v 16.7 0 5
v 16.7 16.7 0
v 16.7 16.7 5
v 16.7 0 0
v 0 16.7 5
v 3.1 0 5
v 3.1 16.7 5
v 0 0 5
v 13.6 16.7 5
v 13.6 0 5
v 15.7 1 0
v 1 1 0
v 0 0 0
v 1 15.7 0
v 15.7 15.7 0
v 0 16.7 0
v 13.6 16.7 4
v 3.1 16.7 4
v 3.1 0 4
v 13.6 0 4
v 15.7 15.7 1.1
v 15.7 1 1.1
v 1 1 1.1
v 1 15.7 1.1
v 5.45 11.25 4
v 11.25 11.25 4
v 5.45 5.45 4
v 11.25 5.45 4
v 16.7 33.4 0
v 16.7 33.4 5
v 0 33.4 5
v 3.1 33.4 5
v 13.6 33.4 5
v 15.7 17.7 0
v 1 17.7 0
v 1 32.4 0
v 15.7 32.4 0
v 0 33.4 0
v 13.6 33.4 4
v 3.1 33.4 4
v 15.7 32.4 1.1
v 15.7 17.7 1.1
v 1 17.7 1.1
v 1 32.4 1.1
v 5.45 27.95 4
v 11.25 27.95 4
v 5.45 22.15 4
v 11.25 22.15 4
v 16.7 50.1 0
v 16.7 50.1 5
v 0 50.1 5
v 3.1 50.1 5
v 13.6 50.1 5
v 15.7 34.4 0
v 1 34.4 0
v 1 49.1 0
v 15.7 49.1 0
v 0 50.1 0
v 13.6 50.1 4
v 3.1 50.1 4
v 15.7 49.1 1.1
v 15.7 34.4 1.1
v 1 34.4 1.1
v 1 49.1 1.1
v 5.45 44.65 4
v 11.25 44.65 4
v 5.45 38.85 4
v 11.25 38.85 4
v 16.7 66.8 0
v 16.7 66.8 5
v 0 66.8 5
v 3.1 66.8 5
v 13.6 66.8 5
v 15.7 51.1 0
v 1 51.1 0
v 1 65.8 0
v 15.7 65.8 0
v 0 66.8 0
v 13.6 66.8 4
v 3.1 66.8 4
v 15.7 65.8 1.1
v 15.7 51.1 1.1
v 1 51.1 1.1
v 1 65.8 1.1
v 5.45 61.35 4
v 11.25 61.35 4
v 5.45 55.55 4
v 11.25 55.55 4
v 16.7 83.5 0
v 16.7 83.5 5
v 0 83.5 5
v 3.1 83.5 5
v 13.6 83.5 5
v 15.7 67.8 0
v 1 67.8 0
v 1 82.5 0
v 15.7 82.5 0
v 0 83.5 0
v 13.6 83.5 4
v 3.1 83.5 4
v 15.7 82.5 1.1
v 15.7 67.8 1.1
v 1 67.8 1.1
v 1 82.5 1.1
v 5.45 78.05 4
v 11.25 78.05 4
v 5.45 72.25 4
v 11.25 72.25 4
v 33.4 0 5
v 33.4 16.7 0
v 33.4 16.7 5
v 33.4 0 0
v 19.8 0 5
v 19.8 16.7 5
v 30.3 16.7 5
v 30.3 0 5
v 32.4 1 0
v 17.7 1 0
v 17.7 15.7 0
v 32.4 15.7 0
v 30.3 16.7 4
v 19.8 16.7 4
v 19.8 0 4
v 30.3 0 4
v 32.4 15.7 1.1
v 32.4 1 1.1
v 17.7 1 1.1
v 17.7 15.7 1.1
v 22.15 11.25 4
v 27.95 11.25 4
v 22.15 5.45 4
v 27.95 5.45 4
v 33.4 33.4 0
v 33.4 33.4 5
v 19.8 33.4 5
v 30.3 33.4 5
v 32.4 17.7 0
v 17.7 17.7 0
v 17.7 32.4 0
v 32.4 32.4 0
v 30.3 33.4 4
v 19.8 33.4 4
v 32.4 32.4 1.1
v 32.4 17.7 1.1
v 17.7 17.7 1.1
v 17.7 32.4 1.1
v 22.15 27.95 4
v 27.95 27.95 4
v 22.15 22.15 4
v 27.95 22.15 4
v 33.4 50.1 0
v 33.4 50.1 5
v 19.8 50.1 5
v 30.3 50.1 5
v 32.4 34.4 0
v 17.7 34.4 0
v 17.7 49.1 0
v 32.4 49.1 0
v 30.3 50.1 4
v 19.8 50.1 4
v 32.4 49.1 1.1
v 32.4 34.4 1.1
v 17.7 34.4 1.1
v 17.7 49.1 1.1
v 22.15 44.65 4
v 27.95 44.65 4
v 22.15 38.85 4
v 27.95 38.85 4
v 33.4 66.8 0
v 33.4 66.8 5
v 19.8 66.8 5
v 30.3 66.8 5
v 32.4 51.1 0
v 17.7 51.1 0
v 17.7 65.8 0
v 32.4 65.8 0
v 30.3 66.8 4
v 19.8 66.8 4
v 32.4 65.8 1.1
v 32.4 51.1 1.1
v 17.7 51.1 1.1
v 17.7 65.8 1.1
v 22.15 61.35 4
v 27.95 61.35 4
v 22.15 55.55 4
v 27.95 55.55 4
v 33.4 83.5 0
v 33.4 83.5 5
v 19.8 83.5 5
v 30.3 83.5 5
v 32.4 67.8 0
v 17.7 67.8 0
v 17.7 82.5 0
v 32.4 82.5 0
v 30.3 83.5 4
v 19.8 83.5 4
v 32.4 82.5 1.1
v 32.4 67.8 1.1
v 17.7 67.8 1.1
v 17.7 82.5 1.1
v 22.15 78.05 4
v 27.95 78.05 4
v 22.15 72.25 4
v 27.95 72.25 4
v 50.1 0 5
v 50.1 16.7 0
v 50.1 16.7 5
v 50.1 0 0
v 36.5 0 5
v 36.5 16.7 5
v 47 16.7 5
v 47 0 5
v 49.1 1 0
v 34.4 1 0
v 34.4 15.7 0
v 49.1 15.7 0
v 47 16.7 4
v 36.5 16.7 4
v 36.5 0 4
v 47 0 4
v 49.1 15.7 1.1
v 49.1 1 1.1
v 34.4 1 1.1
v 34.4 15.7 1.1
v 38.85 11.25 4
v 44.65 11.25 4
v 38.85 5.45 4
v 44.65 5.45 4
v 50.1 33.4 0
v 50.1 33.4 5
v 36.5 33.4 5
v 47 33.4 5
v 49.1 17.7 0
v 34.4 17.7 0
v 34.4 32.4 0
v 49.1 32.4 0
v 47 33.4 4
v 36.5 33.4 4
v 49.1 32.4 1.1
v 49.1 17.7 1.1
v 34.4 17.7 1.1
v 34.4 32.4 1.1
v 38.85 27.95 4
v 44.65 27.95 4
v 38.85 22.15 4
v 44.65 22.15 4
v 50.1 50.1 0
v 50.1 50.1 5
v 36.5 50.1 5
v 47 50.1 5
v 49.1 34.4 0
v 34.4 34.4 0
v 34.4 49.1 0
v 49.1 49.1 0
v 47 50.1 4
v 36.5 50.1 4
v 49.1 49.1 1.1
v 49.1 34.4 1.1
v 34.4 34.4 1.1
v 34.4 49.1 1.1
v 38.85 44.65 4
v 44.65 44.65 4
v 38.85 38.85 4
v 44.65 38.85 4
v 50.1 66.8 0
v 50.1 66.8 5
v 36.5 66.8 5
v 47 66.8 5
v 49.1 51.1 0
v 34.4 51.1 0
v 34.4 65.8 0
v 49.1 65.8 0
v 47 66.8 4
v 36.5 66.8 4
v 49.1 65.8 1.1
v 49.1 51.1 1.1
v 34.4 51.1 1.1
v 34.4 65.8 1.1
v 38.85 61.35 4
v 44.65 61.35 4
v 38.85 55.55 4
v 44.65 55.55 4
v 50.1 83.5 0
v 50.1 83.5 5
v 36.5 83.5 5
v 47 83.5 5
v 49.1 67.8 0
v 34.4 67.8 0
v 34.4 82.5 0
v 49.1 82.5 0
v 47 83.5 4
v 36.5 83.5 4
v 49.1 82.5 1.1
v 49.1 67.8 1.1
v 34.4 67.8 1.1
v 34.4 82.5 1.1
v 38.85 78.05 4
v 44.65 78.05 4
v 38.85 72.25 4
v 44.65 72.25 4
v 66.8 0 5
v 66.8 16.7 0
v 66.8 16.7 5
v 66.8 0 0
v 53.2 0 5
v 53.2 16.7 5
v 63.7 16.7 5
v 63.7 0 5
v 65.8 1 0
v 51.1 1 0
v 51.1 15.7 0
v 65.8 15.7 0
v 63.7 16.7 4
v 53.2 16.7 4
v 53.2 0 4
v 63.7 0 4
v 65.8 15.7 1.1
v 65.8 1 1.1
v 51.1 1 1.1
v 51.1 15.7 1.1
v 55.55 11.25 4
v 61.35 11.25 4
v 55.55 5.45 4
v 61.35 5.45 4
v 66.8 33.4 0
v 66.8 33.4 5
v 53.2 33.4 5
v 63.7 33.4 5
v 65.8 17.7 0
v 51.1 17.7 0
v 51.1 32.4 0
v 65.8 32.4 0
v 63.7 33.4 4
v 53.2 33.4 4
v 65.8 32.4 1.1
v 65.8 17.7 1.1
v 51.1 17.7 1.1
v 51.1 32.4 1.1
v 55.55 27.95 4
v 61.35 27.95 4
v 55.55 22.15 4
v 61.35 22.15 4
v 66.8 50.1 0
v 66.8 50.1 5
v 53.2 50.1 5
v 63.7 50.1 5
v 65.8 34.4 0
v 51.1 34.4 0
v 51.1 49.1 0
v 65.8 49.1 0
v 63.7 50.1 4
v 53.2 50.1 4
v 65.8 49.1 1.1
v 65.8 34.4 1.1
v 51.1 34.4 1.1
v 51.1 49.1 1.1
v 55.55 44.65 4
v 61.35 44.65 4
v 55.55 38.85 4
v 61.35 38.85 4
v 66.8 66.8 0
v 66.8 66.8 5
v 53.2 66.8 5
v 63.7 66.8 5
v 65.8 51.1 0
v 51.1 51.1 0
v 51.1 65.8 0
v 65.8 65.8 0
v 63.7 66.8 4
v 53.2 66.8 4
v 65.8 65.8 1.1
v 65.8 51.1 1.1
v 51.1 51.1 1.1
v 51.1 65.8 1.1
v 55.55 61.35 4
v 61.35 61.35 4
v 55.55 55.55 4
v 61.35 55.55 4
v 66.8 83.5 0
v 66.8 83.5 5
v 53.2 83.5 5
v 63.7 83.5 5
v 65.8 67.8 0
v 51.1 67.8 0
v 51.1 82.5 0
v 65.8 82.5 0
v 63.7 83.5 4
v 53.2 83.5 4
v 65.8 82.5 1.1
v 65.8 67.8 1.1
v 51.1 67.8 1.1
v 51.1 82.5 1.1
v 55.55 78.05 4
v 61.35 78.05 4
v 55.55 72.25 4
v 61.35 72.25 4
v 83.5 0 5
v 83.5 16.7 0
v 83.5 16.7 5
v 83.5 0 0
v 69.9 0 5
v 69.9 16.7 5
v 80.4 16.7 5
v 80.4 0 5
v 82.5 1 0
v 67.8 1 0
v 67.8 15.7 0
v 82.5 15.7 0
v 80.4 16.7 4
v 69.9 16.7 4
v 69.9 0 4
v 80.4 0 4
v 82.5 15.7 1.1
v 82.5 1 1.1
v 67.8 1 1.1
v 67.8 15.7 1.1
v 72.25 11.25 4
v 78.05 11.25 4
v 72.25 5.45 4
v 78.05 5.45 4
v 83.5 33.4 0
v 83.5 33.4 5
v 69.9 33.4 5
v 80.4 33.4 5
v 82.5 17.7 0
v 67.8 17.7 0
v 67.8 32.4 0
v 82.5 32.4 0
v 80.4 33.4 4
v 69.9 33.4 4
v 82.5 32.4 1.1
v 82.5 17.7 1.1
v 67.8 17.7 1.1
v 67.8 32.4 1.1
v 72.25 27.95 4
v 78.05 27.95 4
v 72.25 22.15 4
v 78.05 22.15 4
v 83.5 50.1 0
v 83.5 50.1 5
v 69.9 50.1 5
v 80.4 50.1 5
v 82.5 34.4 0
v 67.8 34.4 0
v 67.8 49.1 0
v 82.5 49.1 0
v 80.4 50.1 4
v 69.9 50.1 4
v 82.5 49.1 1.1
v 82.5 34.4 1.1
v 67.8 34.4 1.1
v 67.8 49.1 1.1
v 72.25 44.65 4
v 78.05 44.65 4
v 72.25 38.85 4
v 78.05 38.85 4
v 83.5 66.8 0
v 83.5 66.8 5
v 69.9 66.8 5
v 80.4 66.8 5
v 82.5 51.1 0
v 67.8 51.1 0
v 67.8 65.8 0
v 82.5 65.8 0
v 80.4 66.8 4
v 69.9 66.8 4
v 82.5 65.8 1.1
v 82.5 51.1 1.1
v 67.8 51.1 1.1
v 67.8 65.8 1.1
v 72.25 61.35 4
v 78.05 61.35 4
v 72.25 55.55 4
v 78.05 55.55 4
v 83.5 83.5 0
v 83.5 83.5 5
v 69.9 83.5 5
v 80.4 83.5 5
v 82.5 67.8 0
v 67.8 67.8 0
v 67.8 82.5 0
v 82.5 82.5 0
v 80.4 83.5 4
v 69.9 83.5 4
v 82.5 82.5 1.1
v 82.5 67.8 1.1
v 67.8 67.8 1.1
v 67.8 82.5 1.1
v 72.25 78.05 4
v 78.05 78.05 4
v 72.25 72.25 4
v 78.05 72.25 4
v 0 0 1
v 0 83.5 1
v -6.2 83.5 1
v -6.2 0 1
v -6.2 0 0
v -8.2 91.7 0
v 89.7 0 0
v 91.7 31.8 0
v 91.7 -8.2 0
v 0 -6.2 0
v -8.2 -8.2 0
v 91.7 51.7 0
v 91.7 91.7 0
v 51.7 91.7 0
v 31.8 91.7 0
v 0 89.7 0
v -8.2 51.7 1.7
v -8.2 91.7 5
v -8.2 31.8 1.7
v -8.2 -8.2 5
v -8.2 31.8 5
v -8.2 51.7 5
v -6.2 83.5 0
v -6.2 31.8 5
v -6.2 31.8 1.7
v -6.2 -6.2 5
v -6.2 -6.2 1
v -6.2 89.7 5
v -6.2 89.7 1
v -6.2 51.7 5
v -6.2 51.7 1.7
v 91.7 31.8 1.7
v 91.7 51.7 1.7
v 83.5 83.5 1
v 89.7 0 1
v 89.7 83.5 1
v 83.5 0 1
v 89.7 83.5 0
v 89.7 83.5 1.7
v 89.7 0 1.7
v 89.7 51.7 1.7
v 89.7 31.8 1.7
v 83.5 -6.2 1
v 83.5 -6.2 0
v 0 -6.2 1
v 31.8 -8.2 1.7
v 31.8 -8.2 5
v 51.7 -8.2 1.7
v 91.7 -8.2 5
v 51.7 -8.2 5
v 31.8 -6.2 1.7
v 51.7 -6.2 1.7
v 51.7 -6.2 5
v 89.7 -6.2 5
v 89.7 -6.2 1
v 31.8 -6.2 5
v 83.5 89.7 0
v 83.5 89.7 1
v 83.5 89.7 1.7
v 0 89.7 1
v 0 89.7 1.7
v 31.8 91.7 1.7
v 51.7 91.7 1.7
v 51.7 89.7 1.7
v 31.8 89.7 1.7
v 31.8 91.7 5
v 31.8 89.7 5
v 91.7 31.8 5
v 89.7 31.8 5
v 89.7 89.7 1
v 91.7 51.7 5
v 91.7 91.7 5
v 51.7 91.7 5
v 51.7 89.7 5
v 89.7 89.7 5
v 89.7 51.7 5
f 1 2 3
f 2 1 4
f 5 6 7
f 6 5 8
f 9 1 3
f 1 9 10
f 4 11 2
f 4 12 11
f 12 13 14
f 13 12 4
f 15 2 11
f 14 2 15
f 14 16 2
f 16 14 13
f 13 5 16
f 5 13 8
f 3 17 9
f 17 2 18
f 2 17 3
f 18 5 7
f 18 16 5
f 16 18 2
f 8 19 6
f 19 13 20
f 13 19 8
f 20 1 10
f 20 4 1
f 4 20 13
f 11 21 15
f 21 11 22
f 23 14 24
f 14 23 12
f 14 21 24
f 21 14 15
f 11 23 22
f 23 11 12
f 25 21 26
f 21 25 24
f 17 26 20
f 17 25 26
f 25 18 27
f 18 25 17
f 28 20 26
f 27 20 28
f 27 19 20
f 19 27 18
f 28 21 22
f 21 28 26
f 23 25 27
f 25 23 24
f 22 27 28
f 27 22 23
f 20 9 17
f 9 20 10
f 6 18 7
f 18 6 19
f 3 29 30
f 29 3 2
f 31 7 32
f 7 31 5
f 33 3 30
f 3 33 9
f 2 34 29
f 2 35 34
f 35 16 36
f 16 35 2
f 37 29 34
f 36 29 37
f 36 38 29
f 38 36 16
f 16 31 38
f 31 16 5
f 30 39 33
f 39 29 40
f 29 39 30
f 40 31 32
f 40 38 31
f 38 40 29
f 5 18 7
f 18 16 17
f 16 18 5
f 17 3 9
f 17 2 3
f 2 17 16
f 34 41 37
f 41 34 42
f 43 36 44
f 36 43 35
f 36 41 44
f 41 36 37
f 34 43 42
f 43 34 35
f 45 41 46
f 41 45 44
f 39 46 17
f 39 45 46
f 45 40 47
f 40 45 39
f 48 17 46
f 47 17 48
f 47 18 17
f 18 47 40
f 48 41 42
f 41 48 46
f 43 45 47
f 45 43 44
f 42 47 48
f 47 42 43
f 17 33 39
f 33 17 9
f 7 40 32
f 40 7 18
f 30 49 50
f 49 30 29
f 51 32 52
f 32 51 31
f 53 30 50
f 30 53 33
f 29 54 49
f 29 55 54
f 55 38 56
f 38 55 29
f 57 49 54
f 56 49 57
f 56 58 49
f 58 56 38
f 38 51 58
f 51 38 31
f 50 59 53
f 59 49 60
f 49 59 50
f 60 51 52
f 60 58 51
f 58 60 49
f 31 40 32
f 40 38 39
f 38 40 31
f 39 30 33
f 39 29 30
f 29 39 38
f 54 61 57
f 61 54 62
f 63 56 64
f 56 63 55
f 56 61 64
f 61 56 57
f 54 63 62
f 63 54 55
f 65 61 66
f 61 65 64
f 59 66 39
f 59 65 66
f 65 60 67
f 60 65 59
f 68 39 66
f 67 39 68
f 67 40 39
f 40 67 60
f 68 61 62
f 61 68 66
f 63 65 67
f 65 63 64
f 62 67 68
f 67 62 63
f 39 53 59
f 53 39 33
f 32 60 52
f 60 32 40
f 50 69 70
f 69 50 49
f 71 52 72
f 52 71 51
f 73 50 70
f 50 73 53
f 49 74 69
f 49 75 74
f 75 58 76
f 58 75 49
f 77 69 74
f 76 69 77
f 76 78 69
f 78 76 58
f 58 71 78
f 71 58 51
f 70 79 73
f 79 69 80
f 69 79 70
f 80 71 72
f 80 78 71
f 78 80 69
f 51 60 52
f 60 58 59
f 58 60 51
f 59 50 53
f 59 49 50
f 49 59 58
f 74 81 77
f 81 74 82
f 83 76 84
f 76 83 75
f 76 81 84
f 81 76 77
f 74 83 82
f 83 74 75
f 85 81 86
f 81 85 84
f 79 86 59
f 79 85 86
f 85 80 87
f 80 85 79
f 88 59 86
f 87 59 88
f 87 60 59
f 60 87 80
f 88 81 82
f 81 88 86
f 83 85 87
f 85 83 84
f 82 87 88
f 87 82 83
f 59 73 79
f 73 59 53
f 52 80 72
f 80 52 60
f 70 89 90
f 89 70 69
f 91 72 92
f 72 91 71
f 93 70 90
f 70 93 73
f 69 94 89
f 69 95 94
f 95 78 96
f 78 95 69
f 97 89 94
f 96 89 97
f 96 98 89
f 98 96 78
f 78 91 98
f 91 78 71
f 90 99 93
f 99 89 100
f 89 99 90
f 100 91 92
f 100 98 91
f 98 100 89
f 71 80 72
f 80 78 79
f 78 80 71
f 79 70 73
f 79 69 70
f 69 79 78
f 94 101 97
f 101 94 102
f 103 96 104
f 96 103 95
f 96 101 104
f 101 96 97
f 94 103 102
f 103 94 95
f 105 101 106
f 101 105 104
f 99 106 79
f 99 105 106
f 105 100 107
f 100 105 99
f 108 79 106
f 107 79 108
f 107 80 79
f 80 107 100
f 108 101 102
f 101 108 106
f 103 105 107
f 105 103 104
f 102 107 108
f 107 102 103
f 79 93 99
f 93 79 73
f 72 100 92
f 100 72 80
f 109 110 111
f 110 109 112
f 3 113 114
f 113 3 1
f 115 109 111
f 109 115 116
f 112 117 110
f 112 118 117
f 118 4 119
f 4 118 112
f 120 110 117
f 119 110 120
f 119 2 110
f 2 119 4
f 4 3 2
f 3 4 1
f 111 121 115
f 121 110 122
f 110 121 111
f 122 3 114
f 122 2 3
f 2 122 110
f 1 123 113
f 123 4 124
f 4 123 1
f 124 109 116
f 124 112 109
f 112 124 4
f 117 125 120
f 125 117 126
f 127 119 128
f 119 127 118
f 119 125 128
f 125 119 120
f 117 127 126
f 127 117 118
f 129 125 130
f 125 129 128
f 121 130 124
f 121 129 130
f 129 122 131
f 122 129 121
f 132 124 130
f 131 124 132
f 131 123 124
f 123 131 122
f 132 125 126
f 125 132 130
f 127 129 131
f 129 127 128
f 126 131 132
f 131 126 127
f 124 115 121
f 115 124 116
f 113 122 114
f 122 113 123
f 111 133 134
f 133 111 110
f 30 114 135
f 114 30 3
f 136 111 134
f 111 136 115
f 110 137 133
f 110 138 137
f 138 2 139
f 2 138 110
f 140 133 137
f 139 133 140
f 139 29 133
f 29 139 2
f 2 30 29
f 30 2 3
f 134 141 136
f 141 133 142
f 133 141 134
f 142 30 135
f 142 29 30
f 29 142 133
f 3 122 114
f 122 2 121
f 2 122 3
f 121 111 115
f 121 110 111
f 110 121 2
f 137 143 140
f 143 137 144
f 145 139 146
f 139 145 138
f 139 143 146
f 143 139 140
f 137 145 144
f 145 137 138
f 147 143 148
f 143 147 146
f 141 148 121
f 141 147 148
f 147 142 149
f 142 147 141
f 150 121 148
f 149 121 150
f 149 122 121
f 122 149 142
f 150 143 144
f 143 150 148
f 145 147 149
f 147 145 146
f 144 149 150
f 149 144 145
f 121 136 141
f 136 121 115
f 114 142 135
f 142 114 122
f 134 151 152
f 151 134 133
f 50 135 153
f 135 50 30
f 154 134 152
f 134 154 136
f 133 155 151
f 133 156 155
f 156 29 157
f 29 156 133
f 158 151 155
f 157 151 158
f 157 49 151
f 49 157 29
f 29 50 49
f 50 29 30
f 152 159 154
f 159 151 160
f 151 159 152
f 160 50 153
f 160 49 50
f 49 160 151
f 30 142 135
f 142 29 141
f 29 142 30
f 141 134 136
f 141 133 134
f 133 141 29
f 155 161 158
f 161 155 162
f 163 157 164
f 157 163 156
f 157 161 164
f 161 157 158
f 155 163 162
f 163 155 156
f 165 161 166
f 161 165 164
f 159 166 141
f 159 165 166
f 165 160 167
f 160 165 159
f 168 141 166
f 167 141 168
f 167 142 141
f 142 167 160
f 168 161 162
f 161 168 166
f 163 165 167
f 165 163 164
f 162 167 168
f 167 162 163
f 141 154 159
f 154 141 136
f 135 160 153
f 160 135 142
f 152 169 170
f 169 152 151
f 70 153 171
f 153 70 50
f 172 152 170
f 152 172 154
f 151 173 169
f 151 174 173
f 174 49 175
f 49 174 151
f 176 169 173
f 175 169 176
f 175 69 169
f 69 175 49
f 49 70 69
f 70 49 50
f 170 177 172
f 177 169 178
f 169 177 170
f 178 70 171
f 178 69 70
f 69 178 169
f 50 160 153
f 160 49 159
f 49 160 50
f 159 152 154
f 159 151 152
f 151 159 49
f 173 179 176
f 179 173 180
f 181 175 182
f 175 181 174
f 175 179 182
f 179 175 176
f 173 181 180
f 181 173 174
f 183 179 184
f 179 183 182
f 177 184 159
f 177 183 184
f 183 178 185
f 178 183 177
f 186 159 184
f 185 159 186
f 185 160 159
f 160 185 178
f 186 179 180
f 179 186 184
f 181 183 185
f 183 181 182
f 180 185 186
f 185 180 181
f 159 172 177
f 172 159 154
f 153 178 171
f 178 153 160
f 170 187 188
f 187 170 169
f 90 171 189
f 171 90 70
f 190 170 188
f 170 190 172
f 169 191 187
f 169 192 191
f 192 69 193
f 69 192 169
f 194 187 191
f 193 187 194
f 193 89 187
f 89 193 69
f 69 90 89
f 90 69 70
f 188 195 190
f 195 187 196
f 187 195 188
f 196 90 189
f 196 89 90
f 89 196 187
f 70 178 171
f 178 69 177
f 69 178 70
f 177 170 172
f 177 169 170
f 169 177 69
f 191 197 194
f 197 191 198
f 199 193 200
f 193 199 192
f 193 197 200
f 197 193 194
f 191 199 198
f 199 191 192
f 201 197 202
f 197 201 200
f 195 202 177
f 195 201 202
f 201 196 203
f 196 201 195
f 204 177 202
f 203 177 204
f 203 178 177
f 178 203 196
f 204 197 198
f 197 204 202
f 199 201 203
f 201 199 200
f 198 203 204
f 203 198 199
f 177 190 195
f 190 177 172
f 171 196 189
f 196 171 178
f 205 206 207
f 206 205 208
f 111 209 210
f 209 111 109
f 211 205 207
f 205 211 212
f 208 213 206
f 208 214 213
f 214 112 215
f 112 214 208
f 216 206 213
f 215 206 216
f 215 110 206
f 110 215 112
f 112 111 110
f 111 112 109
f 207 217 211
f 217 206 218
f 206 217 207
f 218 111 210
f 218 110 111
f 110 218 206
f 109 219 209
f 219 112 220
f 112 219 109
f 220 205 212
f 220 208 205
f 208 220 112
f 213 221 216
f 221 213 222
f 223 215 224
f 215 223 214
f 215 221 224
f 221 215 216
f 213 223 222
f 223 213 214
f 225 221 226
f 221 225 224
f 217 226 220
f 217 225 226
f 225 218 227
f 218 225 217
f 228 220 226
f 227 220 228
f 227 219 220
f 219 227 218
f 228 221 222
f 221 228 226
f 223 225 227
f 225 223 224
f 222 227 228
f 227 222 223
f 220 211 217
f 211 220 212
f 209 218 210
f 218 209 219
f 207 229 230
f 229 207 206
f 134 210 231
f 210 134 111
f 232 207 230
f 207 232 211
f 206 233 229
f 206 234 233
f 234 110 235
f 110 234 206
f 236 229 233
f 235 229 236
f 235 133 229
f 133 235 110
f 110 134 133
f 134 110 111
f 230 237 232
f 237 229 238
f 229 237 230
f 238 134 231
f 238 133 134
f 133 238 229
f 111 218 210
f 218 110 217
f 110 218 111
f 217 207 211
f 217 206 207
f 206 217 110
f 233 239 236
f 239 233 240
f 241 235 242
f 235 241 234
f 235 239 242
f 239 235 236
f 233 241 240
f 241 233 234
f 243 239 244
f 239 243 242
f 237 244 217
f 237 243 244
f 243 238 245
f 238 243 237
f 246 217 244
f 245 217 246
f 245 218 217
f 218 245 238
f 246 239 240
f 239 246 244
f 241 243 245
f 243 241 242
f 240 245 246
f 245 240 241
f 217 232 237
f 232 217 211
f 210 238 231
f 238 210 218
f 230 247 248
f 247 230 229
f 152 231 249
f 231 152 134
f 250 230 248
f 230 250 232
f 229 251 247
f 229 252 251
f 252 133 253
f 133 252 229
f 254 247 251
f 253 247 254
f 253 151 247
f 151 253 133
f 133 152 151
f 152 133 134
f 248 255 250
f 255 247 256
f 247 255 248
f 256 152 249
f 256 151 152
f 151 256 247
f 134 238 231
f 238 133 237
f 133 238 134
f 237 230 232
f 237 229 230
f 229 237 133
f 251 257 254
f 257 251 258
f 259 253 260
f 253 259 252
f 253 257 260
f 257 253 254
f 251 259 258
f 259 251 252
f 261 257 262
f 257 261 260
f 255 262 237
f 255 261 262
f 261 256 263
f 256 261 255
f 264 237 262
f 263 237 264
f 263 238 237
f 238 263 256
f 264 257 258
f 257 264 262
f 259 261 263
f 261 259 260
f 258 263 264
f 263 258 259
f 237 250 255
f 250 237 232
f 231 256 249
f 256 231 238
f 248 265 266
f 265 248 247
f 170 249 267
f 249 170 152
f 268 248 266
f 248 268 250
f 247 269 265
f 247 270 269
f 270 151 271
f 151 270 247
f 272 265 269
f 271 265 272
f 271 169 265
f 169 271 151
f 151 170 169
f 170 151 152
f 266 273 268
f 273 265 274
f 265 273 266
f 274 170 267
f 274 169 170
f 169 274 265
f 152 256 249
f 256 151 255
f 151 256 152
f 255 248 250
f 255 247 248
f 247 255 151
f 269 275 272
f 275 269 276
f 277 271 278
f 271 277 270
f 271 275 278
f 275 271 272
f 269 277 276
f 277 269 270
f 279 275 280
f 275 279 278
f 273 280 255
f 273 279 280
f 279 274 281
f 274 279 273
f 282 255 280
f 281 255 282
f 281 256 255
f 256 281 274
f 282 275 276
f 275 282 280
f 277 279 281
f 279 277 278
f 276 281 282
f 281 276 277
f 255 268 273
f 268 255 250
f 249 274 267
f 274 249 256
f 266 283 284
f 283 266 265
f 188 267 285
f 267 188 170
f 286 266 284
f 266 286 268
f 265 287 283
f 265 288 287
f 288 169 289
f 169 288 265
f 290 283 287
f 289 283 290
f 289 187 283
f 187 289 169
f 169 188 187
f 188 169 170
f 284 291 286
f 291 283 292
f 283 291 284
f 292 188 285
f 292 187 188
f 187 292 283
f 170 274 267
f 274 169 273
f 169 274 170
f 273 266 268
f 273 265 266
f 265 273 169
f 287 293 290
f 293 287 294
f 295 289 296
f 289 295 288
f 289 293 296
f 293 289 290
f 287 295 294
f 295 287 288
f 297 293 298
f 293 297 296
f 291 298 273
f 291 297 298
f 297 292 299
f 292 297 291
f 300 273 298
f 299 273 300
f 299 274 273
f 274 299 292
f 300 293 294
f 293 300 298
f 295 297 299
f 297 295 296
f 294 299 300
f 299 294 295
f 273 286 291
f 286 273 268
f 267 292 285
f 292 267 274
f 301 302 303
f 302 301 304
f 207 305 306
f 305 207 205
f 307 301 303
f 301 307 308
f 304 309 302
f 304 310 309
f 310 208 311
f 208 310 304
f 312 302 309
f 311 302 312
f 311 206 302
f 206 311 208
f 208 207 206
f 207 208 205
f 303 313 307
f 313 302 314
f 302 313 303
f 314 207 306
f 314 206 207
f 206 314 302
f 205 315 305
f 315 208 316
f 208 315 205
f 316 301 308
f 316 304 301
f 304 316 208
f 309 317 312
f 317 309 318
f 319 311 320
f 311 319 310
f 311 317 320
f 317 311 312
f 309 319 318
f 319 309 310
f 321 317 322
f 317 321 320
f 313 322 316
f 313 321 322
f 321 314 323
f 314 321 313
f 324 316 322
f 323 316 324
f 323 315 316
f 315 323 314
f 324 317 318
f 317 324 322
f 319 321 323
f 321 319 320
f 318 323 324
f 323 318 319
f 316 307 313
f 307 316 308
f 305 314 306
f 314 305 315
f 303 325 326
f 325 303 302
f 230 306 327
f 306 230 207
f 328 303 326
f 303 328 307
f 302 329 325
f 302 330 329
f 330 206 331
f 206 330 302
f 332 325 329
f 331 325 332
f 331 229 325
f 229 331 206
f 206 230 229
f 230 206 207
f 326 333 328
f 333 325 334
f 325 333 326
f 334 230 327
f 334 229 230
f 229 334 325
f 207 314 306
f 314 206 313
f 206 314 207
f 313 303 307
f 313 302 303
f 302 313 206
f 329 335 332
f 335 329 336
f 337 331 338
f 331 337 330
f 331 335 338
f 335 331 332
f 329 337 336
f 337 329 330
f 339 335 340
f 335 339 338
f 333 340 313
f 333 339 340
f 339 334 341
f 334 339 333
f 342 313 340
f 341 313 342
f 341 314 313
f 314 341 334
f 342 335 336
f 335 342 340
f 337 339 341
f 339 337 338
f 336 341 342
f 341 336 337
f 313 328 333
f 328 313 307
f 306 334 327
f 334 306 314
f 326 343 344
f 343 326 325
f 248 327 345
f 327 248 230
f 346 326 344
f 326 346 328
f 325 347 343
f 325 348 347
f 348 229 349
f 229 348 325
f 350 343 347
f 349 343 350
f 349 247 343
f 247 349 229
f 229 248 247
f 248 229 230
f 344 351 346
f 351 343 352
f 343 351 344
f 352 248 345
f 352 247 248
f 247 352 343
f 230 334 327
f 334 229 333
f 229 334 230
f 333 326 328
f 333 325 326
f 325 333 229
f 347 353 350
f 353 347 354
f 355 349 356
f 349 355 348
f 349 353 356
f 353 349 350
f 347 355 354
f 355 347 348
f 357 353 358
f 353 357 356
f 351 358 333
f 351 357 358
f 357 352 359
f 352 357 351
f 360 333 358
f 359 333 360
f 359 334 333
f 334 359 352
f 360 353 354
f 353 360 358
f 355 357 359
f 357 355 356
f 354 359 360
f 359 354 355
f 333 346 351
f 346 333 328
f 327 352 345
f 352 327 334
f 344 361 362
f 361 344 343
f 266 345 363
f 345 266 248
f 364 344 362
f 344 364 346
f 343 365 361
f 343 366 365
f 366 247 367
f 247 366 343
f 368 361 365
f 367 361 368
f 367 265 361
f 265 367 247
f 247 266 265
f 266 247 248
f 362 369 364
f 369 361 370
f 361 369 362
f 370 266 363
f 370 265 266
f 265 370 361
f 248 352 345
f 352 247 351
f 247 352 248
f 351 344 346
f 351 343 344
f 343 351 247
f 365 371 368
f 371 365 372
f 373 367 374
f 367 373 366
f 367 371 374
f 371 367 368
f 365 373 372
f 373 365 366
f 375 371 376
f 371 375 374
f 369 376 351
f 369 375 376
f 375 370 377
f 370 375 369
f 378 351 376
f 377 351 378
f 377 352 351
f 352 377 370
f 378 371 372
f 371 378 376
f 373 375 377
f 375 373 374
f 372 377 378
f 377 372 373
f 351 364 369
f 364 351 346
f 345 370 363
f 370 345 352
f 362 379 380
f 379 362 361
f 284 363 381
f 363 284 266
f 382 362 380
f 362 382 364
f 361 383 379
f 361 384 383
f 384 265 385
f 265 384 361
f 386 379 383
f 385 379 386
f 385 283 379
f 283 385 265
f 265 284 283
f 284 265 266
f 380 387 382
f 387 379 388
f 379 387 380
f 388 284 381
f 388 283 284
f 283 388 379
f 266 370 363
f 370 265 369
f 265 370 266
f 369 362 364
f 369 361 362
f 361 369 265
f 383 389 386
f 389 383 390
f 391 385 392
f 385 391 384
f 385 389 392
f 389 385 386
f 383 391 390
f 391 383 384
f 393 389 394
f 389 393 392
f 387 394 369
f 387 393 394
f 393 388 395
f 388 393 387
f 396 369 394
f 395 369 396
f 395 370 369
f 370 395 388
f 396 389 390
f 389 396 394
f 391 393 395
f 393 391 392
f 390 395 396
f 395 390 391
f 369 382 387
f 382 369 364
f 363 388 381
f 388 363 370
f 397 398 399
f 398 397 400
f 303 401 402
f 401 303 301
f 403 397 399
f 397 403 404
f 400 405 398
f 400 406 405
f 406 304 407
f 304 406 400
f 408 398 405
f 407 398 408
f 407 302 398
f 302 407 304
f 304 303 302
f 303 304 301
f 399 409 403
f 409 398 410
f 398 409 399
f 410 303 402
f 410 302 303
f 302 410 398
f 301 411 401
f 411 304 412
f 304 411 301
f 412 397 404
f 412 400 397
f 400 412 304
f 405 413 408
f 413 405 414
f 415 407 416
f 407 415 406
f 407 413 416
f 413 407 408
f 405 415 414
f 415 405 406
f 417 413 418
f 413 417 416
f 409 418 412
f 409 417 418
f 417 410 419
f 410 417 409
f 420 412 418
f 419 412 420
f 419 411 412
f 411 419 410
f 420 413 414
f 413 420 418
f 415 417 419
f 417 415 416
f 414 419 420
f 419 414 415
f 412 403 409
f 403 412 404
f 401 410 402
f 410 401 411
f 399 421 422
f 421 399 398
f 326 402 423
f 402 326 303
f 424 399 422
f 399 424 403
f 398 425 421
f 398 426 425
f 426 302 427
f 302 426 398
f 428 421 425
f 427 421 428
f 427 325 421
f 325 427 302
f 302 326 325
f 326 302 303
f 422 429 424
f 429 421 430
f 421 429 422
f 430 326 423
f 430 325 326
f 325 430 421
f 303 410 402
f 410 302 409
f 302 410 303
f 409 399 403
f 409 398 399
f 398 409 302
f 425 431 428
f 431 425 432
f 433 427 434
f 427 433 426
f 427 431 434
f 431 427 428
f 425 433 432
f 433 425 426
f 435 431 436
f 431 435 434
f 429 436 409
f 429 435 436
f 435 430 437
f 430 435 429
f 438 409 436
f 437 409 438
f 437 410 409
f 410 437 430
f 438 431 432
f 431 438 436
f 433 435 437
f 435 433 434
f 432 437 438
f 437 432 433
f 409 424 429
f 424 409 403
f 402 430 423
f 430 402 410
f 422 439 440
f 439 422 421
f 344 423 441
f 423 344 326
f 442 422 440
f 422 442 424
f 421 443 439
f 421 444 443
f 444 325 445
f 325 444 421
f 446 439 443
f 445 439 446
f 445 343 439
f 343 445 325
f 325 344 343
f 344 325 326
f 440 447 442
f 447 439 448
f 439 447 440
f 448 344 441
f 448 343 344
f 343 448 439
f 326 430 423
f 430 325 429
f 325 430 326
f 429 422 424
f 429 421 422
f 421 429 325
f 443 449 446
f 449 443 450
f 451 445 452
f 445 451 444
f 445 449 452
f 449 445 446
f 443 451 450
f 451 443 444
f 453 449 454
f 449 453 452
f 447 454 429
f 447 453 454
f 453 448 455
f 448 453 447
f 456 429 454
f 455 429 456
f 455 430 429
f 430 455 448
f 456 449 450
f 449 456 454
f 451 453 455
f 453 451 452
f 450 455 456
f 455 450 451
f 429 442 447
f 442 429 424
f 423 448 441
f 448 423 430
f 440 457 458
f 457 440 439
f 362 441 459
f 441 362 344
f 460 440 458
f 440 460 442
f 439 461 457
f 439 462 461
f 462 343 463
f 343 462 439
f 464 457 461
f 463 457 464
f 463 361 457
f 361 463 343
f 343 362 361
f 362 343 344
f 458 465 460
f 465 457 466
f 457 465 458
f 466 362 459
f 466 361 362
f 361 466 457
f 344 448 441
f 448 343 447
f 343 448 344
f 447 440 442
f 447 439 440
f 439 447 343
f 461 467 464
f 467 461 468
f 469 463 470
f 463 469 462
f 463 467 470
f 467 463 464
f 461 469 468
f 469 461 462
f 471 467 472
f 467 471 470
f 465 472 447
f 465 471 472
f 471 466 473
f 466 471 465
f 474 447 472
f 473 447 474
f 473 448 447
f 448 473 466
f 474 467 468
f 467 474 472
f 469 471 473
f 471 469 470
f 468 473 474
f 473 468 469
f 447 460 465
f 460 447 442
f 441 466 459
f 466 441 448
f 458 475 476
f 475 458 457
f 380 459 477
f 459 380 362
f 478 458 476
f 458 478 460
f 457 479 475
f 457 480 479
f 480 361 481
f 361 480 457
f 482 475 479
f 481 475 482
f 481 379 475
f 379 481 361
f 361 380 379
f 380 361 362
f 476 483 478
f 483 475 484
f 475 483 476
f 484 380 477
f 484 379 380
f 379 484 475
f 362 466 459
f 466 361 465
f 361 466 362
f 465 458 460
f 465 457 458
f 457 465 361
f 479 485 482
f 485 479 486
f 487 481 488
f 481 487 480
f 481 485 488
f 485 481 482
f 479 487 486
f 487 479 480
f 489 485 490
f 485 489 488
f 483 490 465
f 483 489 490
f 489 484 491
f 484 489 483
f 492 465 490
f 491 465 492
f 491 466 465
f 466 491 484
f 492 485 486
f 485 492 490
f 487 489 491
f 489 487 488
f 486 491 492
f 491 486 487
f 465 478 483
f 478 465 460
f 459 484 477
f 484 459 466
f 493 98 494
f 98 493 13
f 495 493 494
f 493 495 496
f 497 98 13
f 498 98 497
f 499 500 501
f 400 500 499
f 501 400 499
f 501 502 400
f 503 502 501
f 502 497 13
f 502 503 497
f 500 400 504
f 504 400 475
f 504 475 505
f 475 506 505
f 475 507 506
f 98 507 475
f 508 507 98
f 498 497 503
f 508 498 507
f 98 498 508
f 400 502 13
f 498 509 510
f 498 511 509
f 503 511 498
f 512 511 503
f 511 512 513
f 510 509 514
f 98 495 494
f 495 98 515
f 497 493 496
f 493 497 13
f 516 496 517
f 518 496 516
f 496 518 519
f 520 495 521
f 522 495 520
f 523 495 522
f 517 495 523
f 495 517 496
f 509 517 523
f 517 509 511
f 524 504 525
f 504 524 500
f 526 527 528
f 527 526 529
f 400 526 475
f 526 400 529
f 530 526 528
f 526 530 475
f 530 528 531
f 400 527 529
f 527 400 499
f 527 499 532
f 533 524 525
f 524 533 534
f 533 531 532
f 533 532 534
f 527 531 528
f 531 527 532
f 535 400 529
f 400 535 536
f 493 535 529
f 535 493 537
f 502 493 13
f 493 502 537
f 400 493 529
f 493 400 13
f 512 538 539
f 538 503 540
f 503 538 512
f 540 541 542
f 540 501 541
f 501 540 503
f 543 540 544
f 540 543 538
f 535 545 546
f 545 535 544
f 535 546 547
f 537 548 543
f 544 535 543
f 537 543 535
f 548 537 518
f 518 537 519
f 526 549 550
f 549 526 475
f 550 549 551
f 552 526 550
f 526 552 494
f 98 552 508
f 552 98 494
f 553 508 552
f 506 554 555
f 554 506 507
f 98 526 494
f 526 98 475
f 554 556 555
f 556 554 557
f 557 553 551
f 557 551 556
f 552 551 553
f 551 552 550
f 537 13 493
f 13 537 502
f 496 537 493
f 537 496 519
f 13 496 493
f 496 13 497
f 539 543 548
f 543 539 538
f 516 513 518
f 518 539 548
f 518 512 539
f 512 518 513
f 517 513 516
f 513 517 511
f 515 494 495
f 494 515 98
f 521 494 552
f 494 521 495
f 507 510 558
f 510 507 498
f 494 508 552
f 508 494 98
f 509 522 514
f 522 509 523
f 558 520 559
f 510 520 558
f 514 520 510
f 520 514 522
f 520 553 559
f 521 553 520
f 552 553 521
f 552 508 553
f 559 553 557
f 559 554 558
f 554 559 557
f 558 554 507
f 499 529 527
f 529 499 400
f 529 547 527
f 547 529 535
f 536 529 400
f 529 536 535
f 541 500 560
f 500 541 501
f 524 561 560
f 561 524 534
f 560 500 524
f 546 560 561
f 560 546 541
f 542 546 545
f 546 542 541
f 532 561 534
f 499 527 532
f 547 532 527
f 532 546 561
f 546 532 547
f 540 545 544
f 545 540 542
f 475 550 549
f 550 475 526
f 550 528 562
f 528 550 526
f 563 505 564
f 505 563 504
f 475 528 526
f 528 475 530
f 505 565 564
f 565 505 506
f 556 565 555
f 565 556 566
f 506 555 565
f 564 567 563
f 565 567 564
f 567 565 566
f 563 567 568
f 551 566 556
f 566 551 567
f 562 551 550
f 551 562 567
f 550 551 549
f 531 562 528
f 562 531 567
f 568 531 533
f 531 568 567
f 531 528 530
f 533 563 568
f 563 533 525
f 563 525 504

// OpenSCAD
// SPDX-License-Identifier: GPL-2.0

n_pix_x = 5;
n_pix_y = 5;

corner = true;
bottom = true;
left = true;
right = true;
top = true;

led_h = 4;
led_w = 5.8;
pix_l = 16.7;
plate_h = 0;
wall = 1;
stripe_w = 10.5;
stripe_h = 1;
pix_h = plate_h + led_h + stripe_h;

border_w = 8.2;
border_h = 1.7;
border_thick = 1;
border_wall = 2;
corner_l = 40;

prism_h = 1;

module pixel()
{
	difference() {
		cube([pix_l, pix_l, pix_h]);
		translate([wall, wall, plate_h])
			cube([pix_l - 2 * wall, pix_l - 2 * wall, prism_h]);
		hull() {
			translate([(pix_l - led_w) / 2,
				   (pix_l - led_w) / 2, led_h - 0.6])
				cube([led_w, led_w, 0.6]);
			translate([wall, wall, prism_h])
				cube([pix_l - 2 * wall, pix_l - 2 * wall, 0.1]);
		}
		translate([(pix_l - stripe_w) / 2, 0, plate_h + led_h])
			cube([stripe_w, pix_l, stripe_h]);
	}
}

module do_corner()
{
	cube([border_w, border_w, border_thick]);
	cube([corner_l, border_wall, pix_h]);
	cube([border_wall, corner_l, pix_h]);
}

for(x = [0 : n_pix_x - 1])
	for(y = [0 : n_pix_y - 1])
		translate([x * pix_l, y * pix_l, 0])
			pixel();

if (left) {
	translate([-border_w, 0, 0]) {
		cube([border_w, n_pix_y * pix_l, border_thick]);
		cube([border_wall, n_pix_y * pix_l, border_h]);
	}
}

if (right) {
	translate([n_pix_x * pix_l, 0, 0]) {
		cube([border_w, n_pix_y * pix_l, border_thick]);
		translate([border_w - border_wall, 0, 0])
			cube([border_wall, n_pix_y * pix_l, border_h]);
	}
}

if (bottom) {
	translate([0, -border_w, 0]) {
		cube([n_pix_x * pix_l, border_w, border_thick]);
		cube([n_pix_x * pix_l, border_wall, border_h]);
	}
}

if (top) {
	translate([0, n_pix_y * pix_l, 0]) {
		cube([n_pix_x * pix_l, border_w, border_thick]);
		translate([0, border_w - border_wall])
			cube([n_pix_x * pix_l, border_wall, border_h]);
	}
}

if (corner) {
	if (left && bottom)
		translate([-border_w, -border_w, 0])
			do_corner();
	if (left && top)
		translate([-border_w, n_pix_y * pix_l + border_w, 0])
			rotate([0, 0, 270])
				do_corner();

	if (right && bottom)
		translate([border_w + n_pix_x * pix_l, -border_w, 0])
			rotate([0, 0, 90])
				do_corner();

	if (right && top)
		translate([border_w + n_pix_x * pix_l, n_pix_y * pix_l + border_w, 0])
			rotate([0, 0, 180])
				do_corner();
}
